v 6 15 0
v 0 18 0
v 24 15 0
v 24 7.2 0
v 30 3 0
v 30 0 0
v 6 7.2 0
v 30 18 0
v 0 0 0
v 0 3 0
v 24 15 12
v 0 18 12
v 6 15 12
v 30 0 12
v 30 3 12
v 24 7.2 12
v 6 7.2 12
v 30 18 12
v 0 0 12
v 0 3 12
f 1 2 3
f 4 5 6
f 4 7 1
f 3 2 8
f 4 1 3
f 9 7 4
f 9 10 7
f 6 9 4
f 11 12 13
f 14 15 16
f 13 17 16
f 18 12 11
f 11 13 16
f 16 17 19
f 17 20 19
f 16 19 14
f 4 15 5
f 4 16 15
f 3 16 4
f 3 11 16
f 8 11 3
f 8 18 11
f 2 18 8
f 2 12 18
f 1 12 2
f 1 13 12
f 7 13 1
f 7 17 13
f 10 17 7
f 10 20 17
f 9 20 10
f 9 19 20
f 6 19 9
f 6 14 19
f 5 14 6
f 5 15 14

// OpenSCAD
$fn = 32;

// ----------------------------------------------------------------------
// Key bar: dovetail key, 12 mm thick
// ----------------------------------------------------------------------

// --- parameters (mm) ---
profile_height = 12;      // extrusion height
profile_points = 10;      // points of the closed outline

profile = [[0, 0], [30, 0], [30, 3], [24, 7.2], [24, 15], [30, 18], [0, 18], [6, 15], [6, 7.2], [0, 3]];  // single closed polygon, 10 points, counter clockwise

// --- the one profile operation ---
linear_extrude(height = profile_height) polygon(points = profile);
